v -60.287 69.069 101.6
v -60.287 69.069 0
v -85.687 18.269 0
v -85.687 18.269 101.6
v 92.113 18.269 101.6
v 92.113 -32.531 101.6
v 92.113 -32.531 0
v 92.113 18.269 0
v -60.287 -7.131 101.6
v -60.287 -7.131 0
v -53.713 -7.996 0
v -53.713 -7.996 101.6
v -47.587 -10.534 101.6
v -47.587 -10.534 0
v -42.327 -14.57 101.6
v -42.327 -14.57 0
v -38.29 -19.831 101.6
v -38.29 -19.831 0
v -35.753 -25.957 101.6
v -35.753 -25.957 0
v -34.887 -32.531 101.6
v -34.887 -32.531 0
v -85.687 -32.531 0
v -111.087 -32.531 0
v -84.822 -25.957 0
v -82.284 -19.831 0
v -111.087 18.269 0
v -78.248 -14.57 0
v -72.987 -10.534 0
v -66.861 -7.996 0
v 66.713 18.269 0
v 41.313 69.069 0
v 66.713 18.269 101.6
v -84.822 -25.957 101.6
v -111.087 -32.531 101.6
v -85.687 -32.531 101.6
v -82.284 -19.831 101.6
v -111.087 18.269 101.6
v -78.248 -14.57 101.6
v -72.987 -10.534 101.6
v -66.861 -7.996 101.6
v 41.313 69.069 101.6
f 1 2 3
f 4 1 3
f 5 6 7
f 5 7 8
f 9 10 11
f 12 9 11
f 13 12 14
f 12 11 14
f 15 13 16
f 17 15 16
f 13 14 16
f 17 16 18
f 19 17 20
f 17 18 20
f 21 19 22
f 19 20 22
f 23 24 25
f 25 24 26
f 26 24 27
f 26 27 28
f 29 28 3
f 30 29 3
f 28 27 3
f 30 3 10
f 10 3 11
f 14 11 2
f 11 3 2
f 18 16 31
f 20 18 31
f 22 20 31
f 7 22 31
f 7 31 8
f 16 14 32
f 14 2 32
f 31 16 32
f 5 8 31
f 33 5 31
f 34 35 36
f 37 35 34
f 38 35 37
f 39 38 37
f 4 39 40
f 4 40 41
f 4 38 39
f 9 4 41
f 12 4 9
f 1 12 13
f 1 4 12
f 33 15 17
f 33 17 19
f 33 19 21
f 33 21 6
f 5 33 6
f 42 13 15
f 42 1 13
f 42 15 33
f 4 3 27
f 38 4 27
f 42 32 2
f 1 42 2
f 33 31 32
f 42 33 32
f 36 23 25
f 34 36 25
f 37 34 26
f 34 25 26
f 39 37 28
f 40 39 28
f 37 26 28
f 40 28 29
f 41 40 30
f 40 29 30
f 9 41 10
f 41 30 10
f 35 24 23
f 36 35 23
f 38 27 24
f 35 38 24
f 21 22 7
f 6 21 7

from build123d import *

# Parameters (mm, degrees)
BOSS_EXTRUDE1_DEPTH = 101.6


with BuildPart() as part:
    # Sketch1 → Boss-Extrude1 (new body)
    with BuildSketch(Plane.XY):
        with BuildLine():
            Line((-111.087162468, 18.269301554), (-111.087162468, -32.530698446))
            Line((-111.087162468, -32.530698446), (-85.687162468, -32.530698446))
            ThreePointArc((-85.687162468, -32.530698446), (-78.24767471, -14.570186204), (-60.287162468, -7.130698446))
            ThreePointArc((-60.287162468, -7.130698446), (-42.326650226, -14.570186204), (-34.887162468, -32.530698446))
            Line((-34.887162468, -32.530698446), (15.912837532, -32.530698446))
            Line((15.912837532, -32.530698446), (66.712837532, -32.530698446))
            Line((66.712837532, -32.530698446), (92.112837532, -32.530698446))
            Line((92.112837532, -32.530698446), (92.112837532, 18.269301554))
            Line((92.112837532, 18.269301554), (66.712837532, 18.269301554))
            Line((66.712837532, 18.269301554), (41.312837532, 69.069301554))
            Line((41.312837532, 69.069301554), (-60.287162468, 69.069301554))
            Line((-60.287162468, 69.069301554), (-85.687162468, 18.269301554))
            Line((-85.687162468, 18.269301554), (-111.087162468, 18.269301554))
        make_face()
    extrude(amount=BOSS_EXTRUDE1_DEPTH)


solid = part.part
